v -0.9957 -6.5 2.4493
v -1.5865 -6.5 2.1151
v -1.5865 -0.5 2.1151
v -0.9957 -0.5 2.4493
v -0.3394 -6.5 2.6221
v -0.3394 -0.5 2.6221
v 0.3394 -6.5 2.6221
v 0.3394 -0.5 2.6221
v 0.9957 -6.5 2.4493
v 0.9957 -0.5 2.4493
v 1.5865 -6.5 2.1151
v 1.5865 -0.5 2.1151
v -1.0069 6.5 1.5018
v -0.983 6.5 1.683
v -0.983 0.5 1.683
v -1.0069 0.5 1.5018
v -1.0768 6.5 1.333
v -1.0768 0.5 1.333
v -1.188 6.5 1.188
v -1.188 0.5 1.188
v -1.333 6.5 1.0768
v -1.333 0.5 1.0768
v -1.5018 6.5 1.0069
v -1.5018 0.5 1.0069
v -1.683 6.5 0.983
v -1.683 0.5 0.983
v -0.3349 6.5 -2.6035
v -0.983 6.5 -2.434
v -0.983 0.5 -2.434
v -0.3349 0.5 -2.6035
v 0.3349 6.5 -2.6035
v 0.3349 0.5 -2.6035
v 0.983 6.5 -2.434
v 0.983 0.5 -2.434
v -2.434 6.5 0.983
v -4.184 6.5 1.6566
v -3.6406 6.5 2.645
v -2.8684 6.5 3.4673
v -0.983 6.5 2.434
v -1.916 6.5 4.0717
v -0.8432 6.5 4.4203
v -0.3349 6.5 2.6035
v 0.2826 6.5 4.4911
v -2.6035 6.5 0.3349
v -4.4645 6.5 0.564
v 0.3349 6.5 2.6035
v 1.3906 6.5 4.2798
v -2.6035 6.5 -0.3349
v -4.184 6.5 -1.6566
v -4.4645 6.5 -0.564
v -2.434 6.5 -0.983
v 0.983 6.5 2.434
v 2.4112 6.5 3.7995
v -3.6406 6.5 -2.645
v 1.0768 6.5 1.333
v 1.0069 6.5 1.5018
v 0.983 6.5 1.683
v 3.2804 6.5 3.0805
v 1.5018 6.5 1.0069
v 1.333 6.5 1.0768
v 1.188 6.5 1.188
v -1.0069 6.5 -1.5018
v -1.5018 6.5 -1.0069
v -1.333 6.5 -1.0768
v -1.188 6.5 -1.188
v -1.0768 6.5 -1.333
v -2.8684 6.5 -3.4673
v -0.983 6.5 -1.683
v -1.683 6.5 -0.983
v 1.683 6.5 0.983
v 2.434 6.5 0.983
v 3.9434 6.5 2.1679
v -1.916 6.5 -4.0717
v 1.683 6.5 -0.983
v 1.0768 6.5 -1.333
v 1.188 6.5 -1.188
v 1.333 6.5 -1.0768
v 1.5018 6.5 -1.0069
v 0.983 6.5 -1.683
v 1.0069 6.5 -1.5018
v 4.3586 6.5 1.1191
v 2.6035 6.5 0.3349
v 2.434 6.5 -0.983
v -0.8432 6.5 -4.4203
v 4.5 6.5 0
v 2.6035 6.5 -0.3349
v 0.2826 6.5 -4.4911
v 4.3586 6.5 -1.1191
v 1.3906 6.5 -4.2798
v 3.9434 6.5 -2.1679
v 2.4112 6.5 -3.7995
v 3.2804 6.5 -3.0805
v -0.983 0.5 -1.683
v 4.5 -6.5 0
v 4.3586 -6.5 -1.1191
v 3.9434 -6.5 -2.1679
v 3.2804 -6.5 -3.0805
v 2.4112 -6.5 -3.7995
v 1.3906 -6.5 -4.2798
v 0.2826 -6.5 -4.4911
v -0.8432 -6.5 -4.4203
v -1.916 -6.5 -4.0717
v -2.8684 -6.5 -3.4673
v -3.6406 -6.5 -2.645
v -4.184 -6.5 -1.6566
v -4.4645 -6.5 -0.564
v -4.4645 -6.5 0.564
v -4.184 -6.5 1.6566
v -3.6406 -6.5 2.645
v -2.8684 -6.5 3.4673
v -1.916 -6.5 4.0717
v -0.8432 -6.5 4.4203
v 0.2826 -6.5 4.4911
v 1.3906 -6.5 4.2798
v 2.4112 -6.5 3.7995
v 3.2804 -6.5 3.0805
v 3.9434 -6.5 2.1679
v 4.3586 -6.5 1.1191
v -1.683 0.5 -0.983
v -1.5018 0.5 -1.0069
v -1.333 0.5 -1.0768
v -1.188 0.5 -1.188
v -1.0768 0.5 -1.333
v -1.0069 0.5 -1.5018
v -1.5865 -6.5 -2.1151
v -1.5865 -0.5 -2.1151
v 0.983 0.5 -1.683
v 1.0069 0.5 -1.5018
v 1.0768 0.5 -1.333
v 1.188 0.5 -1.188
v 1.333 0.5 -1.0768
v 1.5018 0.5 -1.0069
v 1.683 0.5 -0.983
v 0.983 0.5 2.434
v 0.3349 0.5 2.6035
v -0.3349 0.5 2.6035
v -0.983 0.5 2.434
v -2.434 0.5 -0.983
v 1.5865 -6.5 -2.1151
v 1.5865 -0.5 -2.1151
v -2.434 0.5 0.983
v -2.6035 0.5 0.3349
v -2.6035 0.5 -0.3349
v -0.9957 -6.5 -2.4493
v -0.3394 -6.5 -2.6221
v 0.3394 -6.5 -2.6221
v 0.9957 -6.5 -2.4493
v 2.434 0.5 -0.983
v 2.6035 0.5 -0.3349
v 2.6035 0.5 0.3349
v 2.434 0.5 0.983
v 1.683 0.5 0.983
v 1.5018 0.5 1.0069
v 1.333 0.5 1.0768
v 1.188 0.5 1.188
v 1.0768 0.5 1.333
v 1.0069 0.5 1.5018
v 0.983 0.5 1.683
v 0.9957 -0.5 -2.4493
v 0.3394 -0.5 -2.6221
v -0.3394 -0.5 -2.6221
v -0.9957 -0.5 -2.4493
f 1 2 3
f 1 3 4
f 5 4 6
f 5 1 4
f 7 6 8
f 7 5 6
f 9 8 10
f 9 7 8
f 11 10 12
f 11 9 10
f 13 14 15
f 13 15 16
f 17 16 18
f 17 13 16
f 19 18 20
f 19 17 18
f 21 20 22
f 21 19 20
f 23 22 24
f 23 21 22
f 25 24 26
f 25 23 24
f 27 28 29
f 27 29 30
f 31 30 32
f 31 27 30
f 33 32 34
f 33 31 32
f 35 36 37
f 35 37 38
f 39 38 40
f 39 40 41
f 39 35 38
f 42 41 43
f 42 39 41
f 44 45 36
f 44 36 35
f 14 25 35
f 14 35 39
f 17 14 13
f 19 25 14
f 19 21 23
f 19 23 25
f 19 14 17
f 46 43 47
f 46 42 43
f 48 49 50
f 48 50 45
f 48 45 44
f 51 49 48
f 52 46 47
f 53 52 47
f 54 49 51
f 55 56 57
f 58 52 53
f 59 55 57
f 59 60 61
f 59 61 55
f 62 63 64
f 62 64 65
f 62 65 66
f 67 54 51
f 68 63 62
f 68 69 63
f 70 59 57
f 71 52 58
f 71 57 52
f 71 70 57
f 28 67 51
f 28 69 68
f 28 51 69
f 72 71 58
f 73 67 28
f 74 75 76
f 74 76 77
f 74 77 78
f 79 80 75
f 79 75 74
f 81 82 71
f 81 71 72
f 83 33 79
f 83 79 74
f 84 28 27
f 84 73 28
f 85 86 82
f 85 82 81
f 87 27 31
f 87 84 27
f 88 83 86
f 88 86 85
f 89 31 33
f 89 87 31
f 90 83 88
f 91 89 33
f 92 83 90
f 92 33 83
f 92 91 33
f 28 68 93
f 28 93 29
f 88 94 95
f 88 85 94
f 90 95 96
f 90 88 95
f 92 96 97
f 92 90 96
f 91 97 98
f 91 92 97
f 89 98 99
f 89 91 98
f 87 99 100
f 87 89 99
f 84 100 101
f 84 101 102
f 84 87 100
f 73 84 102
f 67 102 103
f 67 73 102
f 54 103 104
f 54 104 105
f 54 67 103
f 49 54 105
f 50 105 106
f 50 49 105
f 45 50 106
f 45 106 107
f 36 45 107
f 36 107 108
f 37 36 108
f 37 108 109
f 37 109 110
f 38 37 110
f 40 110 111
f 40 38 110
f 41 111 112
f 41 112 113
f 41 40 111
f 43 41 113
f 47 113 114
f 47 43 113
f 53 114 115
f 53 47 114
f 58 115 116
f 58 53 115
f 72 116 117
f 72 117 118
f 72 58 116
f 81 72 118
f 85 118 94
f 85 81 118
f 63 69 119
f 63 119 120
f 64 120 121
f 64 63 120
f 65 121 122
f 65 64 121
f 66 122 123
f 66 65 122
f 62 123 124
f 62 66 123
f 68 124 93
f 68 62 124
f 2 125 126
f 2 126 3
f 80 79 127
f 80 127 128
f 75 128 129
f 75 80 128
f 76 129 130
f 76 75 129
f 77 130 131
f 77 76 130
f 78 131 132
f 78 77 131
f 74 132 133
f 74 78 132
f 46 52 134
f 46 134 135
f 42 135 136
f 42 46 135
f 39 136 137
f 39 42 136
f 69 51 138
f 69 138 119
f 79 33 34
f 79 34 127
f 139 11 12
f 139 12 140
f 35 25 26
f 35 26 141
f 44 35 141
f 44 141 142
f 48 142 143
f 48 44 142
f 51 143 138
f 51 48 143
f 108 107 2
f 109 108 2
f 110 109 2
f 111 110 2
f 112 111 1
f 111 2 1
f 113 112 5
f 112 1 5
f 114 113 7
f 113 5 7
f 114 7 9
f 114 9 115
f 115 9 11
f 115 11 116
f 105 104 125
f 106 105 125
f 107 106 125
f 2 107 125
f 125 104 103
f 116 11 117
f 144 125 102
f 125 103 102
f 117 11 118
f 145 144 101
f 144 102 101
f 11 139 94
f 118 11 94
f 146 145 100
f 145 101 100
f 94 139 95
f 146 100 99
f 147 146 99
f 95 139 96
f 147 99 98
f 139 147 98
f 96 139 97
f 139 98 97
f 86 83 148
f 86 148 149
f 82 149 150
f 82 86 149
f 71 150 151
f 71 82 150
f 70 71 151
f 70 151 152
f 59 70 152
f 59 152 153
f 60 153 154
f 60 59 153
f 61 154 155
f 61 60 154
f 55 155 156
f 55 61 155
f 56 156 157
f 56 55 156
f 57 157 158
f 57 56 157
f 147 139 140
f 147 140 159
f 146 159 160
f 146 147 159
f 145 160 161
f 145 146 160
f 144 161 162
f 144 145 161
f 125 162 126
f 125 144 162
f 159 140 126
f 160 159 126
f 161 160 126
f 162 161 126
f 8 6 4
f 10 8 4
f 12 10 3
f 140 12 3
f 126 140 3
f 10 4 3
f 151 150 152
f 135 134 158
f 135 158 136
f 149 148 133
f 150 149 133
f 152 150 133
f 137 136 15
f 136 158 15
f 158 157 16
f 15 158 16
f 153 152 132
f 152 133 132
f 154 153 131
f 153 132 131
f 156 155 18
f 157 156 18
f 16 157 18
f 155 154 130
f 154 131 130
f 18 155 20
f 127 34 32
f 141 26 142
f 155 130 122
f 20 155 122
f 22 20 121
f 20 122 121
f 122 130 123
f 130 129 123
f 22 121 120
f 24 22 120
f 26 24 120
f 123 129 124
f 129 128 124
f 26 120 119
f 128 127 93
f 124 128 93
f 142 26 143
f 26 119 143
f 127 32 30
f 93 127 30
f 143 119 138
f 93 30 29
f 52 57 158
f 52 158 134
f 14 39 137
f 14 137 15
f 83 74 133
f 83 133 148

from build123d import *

# Parameters (mm, degrees)
SKETCH1_R           = 4.5
BOSS_EXTRUDE1_DEPTH = 6.5
CUT_EXTRUDE1_DEPTH  = 6
CUT_EXTRUDE2_DEPTH  = 6


with BuildPart() as part:
    # Sketch1 → Boss-Extrude1 (new body, symmetric)
    with BuildSketch(Plane(origin=(0, 0, 0), x_dir=(1, 0, 0), z_dir=(0, 1, 0))):
        Circle(SKETCH1_R)
    extrude(amount=BOSS_EXTRUDE1_DEPTH, both=True)

    # Sketch2 → Cut-Extrude1 (cut)
    with BuildSketch(Plane.XZ.offset(6.5)):
        with BuildLine():
            Line((-1.5865, -2.115124996), (-1.5865, 2.115124996))
            ThreePointArc((-1.5865, 2.115124996), (0, 2.644), (1.5865, 2.115124996))
            Line((1.5865, 2.115124996), (1.5865, -2.115124996))
            ThreePointArc((1.5865, -2.115124996), (0, -2.644), (-1.5865, -2.115124996))
        make_face()
    extrude(amount=-CUT_EXTRUDE1_DEPTH, mode=Mode.SUBTRACT)

    # Sketch3 → Cut-Extrude2 (cut)
    with BuildSketch(Plane(origin=(0, 6.5, 0), x_dir=(1, 0, 0), z_dir=(0, 1, 0))):
        with BuildLine():
            Line((0.983, 2.433995892), (0.983, 1.683))
            ThreePointArc((0.983, 1.683), (1.188025253, 1.188025253), (1.683, 0.983))
            Line((1.683, 0.983), (2.433995892, 0.983))
            ThreePointArc((2.433995892, 0.983), (2.625, 0), (2.433995892, -0.983))
            Line((2.433995892, -0.983), (1.683, -0.983))
            ThreePointArc((1.683, -0.983), (1.188025253, -1.188025253), (0.983, -1.683))
            Line((0.983, -1.683), (0.983, -2.433995892))
            ThreePointArc((0.983, -2.433995892), (0, -2.625), (-0.983, -2.433995892))
            Line((-0.983, -2.433995892), (-0.983, -1.683))
            ThreePointArc((-0.983, -1.683), (-1.188025253, -1.188025253), (-1.683, -0.983))
            Line((-1.683, -0.983), (-2.433995892, -0.983))
            ThreePointArc((-2.433995892, -0.983), (-2.625, 0), (-2.433995892, 0.983))
            Line((-2.433995892, 0.983), (-1.683, 0.983))
            ThreePointArc((-1.683, 0.983), (-1.188025253, 1.188025253), (-0.983, 1.683))
            Line((-0.983, 1.683), (-0.983, 2.433995892))
            ThreePointArc((-0.983, 2.433995892), (0, 2.625), (0.983, 2.433995892))
        make_face()
    extrude(amount=-CUT_EXTRUDE2_DEPTH, mode=Mode.SUBTRACT)


solid = part.part
